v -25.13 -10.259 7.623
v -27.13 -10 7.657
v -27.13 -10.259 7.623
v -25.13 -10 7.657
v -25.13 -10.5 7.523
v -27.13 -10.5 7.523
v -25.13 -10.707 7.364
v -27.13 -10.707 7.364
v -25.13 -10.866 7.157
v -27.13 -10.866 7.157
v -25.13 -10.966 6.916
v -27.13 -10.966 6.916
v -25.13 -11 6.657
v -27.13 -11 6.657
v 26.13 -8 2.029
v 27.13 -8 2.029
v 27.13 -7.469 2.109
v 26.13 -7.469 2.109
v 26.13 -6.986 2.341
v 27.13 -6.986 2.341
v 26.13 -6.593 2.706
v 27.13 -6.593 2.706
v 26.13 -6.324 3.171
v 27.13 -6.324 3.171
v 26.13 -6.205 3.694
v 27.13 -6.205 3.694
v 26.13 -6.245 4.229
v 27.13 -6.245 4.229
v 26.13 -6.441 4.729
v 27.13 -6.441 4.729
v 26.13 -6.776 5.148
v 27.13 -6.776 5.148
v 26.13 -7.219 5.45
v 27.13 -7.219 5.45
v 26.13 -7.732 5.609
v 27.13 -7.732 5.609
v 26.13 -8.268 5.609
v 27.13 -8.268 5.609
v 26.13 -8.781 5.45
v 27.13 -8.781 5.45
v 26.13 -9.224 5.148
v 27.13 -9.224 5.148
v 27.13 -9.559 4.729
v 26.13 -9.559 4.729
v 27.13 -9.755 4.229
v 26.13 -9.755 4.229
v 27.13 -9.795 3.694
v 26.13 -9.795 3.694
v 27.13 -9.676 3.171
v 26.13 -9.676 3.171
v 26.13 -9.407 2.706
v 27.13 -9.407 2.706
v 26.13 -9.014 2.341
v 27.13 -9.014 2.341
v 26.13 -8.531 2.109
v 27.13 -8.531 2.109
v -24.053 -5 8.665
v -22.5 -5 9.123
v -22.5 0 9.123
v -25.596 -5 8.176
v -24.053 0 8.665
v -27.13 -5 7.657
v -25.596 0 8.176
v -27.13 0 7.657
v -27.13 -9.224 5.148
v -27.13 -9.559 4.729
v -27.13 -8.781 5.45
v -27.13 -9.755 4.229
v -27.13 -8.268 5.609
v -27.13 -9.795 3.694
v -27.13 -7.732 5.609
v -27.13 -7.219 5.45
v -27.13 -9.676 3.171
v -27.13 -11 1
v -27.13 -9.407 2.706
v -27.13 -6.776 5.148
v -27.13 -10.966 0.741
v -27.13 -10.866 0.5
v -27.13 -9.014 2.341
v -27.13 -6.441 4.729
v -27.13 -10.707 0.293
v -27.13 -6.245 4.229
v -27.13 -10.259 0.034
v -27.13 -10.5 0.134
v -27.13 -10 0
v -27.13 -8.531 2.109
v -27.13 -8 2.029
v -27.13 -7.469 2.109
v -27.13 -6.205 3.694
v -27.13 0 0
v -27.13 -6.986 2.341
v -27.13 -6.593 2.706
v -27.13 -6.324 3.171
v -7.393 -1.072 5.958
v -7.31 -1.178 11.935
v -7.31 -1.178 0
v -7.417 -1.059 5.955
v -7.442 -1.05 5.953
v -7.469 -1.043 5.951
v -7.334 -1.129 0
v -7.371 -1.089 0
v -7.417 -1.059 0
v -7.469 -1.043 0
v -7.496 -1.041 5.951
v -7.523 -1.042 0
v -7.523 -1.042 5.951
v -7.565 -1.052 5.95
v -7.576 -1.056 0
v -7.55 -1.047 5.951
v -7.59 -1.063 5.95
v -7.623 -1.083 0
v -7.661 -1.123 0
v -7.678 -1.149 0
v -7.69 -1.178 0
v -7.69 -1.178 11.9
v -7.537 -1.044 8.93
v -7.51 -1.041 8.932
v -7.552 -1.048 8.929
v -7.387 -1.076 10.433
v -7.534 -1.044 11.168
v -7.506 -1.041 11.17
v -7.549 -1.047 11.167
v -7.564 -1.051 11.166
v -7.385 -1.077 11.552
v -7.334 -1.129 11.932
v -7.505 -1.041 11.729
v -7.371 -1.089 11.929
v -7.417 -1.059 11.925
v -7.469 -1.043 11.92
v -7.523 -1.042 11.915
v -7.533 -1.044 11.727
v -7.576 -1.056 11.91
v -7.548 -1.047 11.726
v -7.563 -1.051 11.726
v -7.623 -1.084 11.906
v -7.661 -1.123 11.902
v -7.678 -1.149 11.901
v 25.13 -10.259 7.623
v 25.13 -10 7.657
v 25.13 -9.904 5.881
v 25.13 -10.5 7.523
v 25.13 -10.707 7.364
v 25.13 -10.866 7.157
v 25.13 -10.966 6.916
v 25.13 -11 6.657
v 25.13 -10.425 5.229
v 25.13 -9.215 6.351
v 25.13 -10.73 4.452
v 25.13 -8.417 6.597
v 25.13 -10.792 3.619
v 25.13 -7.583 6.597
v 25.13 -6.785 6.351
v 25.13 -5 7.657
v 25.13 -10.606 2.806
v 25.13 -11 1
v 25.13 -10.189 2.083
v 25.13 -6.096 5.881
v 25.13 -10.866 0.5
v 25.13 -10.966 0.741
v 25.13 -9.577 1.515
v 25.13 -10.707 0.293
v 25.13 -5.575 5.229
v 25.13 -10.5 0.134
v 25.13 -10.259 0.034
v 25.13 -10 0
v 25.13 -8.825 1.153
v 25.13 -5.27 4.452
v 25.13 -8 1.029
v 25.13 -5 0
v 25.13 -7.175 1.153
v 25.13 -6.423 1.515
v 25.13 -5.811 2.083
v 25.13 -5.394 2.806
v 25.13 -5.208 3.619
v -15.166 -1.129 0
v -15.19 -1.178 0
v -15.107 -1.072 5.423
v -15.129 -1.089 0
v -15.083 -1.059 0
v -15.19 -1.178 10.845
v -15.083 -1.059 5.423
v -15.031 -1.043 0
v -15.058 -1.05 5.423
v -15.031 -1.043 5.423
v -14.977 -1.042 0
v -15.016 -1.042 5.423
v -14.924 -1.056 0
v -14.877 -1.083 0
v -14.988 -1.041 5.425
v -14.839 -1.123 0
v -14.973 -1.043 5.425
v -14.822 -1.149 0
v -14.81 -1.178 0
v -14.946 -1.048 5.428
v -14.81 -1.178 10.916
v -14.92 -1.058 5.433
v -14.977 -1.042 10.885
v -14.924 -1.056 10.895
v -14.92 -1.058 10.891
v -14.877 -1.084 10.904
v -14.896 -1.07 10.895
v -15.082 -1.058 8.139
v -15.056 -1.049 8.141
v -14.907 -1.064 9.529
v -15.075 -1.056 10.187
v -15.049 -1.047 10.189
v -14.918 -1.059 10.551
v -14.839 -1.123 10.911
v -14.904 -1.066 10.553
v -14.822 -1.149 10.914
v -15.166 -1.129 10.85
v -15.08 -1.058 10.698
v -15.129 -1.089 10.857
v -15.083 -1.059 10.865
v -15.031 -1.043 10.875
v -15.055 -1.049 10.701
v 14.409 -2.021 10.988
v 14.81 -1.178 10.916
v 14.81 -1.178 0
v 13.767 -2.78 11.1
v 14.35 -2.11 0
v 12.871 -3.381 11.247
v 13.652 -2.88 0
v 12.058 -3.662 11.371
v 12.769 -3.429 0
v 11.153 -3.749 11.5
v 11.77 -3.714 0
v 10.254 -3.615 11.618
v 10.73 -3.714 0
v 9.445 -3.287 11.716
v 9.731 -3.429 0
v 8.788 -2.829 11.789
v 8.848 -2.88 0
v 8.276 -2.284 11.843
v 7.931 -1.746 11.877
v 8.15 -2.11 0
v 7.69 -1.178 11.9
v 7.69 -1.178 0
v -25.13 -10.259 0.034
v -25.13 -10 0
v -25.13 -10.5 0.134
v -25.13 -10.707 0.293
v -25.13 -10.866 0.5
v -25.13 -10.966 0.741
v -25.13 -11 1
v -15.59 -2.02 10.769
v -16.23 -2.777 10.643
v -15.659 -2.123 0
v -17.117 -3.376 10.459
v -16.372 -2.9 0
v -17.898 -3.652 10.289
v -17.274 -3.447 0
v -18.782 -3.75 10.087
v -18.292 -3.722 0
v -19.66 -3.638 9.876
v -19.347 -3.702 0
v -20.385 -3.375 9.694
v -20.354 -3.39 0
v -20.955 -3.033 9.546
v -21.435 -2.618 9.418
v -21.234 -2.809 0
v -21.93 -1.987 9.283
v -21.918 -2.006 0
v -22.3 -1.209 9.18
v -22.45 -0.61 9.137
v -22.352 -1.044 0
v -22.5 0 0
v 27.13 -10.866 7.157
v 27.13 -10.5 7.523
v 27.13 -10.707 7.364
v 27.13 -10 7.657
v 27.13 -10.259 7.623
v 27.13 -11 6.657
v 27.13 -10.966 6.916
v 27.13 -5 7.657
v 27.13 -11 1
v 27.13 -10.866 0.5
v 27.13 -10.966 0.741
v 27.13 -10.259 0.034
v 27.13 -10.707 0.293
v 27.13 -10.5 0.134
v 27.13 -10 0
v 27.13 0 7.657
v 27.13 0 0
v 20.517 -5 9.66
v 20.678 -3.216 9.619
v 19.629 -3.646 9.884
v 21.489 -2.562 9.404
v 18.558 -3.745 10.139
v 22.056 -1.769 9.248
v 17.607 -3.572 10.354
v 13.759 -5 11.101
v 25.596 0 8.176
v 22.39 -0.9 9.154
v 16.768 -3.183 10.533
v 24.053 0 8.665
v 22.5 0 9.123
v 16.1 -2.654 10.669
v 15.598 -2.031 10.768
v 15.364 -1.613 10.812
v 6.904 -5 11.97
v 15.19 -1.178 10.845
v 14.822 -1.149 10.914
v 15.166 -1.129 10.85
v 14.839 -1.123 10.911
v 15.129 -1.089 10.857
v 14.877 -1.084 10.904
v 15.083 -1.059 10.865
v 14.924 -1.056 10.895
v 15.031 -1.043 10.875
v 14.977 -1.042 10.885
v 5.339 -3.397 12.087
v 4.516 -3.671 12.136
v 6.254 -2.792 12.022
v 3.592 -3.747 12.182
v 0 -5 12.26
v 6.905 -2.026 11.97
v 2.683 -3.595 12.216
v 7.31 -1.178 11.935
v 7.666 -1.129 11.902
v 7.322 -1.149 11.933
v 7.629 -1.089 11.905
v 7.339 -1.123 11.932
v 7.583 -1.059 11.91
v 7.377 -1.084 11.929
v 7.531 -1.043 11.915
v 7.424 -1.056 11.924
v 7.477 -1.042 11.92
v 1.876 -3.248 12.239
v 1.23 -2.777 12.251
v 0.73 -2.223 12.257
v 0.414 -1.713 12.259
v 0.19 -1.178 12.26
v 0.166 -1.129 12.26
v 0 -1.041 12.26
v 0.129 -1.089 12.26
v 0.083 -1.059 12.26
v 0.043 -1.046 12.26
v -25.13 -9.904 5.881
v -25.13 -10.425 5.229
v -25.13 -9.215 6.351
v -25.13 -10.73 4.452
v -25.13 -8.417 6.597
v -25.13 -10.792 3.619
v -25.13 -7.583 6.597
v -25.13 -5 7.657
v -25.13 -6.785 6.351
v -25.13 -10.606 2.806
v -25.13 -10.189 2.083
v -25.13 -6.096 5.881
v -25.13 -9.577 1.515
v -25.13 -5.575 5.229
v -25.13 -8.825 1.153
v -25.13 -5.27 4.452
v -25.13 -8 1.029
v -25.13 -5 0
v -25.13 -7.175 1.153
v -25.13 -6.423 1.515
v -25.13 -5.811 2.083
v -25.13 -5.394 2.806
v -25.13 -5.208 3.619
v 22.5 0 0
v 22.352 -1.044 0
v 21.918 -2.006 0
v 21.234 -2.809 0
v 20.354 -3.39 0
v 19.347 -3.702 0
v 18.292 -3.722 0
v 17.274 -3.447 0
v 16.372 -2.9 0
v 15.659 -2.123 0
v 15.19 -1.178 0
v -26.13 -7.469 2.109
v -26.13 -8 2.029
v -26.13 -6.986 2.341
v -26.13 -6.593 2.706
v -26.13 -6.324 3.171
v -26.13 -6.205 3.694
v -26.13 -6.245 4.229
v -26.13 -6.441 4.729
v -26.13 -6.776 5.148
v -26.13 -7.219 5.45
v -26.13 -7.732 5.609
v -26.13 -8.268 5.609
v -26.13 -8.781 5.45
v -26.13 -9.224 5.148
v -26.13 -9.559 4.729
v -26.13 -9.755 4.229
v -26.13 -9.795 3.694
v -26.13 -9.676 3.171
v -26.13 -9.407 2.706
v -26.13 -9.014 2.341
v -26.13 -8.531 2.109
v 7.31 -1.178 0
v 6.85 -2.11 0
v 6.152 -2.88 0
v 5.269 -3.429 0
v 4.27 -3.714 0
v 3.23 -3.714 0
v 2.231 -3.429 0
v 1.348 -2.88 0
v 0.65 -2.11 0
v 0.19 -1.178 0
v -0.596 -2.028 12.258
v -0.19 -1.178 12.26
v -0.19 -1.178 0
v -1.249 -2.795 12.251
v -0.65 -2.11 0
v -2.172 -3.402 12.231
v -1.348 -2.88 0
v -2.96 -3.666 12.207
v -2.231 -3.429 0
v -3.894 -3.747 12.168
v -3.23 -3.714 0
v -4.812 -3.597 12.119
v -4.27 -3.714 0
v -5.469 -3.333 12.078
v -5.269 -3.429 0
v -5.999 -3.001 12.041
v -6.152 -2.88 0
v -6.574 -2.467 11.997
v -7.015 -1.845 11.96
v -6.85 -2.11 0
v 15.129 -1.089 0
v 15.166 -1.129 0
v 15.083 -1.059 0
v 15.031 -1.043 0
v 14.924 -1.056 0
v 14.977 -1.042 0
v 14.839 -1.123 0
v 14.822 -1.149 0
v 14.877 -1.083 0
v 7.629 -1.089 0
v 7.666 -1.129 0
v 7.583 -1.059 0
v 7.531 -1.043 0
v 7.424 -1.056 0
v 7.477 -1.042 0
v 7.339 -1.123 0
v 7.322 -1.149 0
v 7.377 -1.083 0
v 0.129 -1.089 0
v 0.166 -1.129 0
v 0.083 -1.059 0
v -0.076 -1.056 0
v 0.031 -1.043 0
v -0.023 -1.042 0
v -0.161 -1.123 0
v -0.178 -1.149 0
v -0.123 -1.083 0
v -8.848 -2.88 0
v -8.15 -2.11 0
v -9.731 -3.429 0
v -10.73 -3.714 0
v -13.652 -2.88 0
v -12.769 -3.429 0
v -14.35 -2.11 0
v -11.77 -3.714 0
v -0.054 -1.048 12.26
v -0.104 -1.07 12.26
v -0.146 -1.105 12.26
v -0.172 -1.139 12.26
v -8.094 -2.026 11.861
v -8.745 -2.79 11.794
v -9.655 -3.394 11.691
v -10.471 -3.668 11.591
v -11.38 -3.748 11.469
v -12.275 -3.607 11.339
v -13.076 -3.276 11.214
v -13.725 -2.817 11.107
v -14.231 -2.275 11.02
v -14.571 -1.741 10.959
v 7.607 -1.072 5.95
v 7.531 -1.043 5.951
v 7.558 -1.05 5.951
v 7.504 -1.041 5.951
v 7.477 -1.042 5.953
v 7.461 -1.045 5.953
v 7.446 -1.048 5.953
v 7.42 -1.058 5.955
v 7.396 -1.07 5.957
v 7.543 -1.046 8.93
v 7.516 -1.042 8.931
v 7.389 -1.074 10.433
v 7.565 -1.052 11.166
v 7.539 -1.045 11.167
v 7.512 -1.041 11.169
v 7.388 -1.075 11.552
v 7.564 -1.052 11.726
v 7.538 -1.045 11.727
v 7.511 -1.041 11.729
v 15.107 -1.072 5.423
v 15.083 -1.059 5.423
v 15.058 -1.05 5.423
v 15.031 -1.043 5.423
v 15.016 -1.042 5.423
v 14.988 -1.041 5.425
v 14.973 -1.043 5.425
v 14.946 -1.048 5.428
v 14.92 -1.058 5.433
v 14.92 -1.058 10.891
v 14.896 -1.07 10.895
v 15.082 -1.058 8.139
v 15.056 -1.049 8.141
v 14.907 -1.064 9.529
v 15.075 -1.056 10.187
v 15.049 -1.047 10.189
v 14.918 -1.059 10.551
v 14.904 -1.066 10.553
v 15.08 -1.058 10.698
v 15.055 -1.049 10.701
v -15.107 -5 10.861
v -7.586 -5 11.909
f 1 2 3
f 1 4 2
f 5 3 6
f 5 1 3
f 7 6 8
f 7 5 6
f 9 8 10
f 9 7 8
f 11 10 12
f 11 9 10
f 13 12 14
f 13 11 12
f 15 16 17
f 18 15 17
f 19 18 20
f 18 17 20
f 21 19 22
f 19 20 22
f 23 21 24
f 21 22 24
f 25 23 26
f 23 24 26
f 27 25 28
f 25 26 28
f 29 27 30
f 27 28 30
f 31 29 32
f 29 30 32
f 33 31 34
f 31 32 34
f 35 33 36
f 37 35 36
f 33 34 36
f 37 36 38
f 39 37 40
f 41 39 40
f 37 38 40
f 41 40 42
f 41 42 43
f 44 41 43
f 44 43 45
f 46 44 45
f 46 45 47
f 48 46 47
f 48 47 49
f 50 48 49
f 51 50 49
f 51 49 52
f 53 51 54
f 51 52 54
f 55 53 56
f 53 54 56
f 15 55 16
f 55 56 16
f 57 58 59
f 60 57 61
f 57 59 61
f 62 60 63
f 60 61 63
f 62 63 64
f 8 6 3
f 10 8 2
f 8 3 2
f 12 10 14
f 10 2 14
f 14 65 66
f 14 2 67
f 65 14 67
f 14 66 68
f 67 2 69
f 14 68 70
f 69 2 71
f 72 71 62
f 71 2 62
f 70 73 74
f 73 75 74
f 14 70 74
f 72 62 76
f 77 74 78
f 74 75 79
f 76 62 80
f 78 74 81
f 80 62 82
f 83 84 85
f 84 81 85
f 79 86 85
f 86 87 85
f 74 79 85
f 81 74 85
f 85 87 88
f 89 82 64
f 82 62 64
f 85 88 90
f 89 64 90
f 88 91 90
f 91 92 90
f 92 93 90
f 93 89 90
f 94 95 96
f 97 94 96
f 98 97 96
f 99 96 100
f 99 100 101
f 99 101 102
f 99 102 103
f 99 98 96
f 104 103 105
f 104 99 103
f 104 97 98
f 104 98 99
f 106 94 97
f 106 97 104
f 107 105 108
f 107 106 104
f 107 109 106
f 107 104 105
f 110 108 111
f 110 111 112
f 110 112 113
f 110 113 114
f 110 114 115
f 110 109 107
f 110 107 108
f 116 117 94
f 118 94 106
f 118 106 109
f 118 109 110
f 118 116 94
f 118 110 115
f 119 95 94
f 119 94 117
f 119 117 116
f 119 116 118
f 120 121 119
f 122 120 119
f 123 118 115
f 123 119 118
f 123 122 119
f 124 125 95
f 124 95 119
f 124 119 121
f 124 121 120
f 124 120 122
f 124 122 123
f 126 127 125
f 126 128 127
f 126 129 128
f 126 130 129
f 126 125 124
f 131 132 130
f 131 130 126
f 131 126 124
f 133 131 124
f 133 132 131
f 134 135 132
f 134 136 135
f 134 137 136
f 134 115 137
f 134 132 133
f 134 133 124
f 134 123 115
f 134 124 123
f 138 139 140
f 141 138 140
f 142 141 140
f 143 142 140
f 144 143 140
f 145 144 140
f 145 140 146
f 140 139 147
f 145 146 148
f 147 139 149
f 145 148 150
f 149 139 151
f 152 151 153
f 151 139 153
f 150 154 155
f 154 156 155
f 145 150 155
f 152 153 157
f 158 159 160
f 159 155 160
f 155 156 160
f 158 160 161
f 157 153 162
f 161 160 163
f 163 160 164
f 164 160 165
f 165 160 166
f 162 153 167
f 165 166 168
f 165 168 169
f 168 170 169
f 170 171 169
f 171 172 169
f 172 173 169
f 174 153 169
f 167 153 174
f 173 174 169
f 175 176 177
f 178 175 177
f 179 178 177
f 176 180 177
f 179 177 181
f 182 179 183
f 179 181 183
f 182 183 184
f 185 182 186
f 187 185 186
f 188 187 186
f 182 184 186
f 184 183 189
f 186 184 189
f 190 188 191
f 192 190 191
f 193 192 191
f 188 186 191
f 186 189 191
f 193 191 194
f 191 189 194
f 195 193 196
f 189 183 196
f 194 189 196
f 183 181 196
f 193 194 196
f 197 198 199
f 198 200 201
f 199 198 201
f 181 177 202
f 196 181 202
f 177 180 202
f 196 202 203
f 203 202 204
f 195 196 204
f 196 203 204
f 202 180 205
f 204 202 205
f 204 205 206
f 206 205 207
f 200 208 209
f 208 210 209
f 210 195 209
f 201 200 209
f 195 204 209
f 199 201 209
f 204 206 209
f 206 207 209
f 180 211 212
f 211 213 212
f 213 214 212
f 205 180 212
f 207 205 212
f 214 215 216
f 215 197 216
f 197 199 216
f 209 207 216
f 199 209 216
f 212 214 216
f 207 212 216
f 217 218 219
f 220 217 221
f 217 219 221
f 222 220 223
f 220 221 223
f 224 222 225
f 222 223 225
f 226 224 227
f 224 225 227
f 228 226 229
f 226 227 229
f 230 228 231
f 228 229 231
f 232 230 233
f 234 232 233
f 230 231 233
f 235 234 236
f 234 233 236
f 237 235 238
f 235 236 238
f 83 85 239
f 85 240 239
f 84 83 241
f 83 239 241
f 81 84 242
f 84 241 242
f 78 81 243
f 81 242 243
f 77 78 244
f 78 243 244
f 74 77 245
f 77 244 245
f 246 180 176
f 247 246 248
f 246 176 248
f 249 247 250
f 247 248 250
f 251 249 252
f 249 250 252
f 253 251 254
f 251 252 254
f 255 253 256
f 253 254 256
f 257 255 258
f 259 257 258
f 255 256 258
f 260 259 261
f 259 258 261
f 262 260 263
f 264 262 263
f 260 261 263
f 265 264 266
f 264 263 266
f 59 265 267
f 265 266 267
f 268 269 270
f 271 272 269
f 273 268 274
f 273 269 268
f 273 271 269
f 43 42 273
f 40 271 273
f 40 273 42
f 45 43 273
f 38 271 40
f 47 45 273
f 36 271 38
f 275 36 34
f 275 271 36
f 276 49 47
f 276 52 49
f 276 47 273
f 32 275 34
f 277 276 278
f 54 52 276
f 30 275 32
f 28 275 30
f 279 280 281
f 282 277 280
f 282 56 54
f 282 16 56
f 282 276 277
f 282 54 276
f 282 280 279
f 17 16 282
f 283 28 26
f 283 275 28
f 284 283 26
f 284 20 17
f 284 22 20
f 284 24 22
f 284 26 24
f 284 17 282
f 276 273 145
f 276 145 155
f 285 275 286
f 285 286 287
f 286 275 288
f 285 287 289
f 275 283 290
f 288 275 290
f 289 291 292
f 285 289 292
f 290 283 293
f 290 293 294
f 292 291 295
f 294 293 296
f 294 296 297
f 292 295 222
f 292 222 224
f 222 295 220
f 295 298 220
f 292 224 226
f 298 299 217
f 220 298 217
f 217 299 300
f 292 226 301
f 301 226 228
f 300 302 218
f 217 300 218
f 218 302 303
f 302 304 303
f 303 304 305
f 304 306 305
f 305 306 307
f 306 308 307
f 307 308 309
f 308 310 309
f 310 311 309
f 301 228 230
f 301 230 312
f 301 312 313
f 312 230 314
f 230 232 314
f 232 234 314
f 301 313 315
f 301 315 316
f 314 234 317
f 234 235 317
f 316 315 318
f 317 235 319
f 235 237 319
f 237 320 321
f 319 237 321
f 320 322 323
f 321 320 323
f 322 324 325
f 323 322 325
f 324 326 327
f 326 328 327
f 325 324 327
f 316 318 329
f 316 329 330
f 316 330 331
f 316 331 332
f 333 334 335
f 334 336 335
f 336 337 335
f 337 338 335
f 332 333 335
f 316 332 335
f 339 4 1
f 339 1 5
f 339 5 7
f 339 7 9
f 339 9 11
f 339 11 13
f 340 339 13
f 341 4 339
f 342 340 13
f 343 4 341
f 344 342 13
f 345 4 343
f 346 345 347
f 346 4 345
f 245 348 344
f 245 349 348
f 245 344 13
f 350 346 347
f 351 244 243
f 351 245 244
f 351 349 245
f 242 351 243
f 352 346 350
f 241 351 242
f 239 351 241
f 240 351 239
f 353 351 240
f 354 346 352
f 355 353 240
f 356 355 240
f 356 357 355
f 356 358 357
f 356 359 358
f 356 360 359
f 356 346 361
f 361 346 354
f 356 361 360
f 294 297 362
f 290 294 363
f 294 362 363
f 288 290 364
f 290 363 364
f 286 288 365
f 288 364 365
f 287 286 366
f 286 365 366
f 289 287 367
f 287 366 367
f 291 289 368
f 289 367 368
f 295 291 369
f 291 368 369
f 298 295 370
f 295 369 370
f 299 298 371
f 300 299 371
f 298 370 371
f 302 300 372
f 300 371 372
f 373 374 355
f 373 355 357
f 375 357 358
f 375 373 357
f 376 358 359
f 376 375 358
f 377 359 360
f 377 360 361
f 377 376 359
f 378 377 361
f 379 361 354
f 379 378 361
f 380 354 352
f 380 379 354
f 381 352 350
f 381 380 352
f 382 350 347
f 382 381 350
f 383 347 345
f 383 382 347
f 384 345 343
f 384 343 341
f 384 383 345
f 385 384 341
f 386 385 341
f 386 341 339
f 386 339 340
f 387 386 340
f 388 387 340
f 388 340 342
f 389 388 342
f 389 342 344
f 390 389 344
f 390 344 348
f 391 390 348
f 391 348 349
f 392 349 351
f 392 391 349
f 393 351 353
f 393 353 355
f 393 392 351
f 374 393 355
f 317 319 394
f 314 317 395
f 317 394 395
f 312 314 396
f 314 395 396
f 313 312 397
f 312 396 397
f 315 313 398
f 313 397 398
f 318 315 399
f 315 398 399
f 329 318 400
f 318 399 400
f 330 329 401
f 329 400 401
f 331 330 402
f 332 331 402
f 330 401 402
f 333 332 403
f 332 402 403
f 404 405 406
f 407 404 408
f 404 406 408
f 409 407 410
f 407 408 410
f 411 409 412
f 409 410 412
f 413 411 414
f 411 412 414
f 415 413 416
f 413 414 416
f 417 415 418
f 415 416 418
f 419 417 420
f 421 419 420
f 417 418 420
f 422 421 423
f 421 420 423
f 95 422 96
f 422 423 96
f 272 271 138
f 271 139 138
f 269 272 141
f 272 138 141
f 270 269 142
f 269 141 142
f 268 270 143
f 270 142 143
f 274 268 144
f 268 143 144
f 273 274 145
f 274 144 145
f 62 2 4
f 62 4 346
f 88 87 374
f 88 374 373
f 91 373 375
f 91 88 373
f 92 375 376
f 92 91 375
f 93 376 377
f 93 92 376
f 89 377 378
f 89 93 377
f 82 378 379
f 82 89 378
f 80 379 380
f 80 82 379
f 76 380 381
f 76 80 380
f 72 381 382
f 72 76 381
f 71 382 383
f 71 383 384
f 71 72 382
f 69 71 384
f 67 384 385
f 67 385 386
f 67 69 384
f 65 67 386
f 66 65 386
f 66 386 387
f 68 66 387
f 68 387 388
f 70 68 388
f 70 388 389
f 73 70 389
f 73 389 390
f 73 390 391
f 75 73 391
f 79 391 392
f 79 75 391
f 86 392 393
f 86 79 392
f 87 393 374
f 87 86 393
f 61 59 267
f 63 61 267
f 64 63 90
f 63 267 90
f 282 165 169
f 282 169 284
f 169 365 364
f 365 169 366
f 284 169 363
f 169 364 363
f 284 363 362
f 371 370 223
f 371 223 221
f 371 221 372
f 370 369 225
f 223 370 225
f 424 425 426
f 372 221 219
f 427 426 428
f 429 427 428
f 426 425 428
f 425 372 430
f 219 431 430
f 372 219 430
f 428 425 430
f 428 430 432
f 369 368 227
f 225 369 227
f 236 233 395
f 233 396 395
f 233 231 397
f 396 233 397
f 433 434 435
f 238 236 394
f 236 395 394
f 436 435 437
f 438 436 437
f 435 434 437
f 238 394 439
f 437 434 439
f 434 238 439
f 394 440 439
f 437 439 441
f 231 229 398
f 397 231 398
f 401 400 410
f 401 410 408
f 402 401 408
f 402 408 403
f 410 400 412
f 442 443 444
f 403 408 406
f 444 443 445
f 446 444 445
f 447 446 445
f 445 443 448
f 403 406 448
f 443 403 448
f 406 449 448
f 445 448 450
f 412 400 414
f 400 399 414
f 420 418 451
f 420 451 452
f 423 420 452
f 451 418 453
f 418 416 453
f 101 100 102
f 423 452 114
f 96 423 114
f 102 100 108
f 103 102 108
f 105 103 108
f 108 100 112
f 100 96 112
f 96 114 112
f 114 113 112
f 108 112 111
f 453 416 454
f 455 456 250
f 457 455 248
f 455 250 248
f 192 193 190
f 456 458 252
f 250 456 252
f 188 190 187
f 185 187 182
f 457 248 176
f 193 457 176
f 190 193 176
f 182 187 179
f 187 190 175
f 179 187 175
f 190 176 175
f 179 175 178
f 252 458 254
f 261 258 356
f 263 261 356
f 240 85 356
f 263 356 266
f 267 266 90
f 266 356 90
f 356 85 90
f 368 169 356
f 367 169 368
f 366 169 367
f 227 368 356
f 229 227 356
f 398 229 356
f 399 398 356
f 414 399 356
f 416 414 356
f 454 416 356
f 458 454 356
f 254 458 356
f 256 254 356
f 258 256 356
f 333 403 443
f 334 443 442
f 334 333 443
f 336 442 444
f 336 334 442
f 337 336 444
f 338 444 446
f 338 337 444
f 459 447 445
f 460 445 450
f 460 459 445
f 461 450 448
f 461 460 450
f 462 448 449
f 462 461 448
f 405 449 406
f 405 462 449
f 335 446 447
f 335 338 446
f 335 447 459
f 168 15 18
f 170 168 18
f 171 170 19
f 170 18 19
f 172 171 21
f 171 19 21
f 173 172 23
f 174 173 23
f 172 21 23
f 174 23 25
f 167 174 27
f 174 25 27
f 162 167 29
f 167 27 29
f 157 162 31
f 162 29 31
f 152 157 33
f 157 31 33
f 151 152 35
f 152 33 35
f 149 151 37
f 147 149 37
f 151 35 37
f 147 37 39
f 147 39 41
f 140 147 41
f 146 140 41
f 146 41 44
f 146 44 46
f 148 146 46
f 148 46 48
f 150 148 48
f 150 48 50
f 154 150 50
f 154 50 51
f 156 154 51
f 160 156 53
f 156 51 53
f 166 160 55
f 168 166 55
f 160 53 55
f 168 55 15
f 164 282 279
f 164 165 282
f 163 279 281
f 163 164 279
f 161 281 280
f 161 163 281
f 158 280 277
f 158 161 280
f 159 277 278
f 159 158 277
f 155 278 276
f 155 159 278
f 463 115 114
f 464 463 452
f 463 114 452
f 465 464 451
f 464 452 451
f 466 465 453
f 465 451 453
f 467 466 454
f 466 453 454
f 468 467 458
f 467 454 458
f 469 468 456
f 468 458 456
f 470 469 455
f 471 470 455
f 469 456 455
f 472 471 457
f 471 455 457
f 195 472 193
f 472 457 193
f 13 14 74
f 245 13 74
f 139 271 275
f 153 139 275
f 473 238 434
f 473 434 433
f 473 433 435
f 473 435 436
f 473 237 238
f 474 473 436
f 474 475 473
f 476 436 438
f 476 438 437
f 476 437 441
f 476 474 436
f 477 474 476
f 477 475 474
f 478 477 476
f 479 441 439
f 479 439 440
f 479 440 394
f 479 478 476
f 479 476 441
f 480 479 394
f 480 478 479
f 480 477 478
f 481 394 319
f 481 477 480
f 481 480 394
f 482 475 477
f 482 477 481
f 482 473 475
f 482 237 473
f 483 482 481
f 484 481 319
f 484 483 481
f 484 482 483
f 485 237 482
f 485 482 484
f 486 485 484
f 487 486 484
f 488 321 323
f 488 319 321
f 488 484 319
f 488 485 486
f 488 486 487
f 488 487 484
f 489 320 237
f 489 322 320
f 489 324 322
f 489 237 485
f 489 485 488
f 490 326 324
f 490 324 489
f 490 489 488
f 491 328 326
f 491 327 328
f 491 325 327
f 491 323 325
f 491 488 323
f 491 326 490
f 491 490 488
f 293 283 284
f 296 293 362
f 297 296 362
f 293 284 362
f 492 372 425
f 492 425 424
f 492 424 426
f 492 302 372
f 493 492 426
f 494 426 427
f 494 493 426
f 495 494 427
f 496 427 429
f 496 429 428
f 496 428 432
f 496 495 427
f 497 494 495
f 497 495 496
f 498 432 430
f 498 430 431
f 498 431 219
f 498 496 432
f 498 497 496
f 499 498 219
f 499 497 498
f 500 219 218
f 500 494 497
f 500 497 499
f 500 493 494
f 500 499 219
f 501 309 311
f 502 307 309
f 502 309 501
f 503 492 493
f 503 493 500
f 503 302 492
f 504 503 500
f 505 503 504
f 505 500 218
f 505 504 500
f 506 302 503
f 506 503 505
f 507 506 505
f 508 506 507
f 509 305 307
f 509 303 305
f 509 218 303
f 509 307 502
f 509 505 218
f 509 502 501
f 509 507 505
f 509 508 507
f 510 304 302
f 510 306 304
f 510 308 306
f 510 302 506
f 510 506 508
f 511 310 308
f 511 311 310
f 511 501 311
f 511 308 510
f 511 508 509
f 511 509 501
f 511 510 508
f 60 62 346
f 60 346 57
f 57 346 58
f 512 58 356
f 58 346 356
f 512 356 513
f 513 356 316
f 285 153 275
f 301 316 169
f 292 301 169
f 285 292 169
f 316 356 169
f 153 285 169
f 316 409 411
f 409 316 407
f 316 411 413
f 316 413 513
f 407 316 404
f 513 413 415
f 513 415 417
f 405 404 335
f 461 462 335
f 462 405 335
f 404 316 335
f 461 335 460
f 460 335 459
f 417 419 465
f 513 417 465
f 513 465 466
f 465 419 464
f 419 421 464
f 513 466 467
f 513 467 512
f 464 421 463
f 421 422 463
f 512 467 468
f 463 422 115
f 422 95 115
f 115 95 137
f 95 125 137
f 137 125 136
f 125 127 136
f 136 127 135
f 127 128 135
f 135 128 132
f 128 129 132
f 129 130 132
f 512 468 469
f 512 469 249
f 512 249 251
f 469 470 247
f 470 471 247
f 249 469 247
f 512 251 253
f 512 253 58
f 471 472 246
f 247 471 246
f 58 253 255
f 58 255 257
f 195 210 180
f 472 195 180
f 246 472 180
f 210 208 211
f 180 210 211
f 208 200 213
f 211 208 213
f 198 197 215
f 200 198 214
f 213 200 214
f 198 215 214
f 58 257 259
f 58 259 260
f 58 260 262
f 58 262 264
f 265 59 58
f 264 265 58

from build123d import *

# Parameters (mm, degrees)
RESSALTO_EXTRUS_O2_DEPTH = 12.26
CORTE_EXTRUS_O1_DEPTH    = 12.26
FILETE1_R                = 0.2
ESBO_O4_W                = 7.65739308
ESBO_O4_H                = 6
ESBO_O4_R                = 1.8
RESSALTO_EXTRUS_O3_DEPTH = 2
FILETE2_R                = 1
CHANFRO1_SIZE            = 1


with BuildPart() as part:
    # Esboço2 → Ressalto-extrusão2 (new body)
    with BuildSketch(Plane.XY):
        with BuildLine():
            Line((-22.5, 0), (-27.13, 0))
            Line((-27.13, 0), (-27.13, -5))
            Line((-27.13, -5), (27.13, -5))
            Line((27.13, -5), (27.13, 0))
            Line((27.13, 0), (22.5, 0))
            ThreePointArc((22.5, 0), (18.75, -3.75), (15, 0))
            ThreePointArc((15, 0), (11.25, -3.75), (7.5, 0))
            ThreePointArc((7.5, 0), (3.75, -3.75), (0, 0))
            ThreePointArc((0, 0), (-3.75, -3.75), (-7.5, 0))
            ThreePointArc((-7.5, 0), (-11.25, -3.75), (-15, 0))
            ThreePointArc((-15, 0), (-18.75, -3.75), (-22.5, 0))
        make_face()
    extrude(amount=RESSALTO_EXTRUS_O2_DEPTH)

    # Esboço3 → Corte-extrusão1 (cut)
    with BuildSketch(Plane(origin=(0, 0, 0), x_dir=(1, 0, 0), z_dir=(0, 1, 0))):
        with BuildLine():
            ThreePointArc((-22.5, -9.123053531), (-24.825818519, -8.424398849), (-27.13, -7.65739308))
            Line((-27.13, -7.65739308), (-27.13, -12.26))
            Line((-27.13, -12.26), (-22.5, -12.26))
            Line((-22.5, -12.26), (-22.5, -9.123053531))
        make_face()
        with BuildLine():
            ThreePointArc((-3.28e-07, -12.26), (-11.358812085, -11.471988978), (-22.5, -9.123053531))
            Line((-22.5, -9.123053531), (-22.5, -12.26))
            Line((-22.5, -12.26), (-3.28e-07, -12.26))
        make_face()
        with BuildLine():
            ThreePointArc((27.13, -7.65739308), (13.758823284, -11.101186069), (-3.28e-07, -12.26))
            Line((-3.28e-07, -12.26), (27.13, -12.26))
            Line((27.13, -12.26), (27.13, -7.65739308))
        make_face()
    extrude(amount=-CORTE_EXTRUS_O1_DEPTH, mode=Mode.SUBTRACT)

    # Filete1
    filete1_edges = [part.edges().sort_by_distance(p)[0] for p in [
        (15, 0, 5.440411719),
        (7.5, 0, 5.958691385),
        (0, 0, 6.13),
        (-7.5, 0, 5.958691385),
        (-15, 0, 5.440411719),
    ]]
    fillet(filete1_edges, radius=FILETE1_R)

    # Esboço4 → Ressalto-extrusão3 (add)
    with BuildSketch(Plane(origin=(27.13, 0, 0), x_dir=(0, 0, -1), z_dir=(1, 0, 0))):
        with Locations((-3.82869654, -8)):
            Rectangle(ESBO_O4_W, ESBO_O4_H)
        with Locations((-3.82869654, -8)):
            Circle(ESBO_O4_R, mode=Mode.SUBTRACT)
    ressalto_extrus_o3 = extrude(amount=-RESSALTO_EXTRUS_O3_DEPTH)

    # Espelhar1: Ressalto-extrusão3 across plane
    add(ressalto_extrus_o3.mirror(Plane(origin=(0, 0, 0), x_dir=(0, 0, 1), z_dir=(1, 0, 0))))

    # Filete2
    filete2_edges = [part.edges().sort_by_distance(p)[0] for p in [
        (26.13, -11, 7.65739308),
        (26.13, -11, 0),
        (-26.13, -11, 7.65739308),
        (-26.13, -11, 0),
    ]]
    fillet(filete2_edges, radius=FILETE2_R)

    # Chanfro1
    chanfro1_edges = [part.edges().sort_by_distance(p)[0] for p in [
        (25.13, -8, 5.62869654),
        (-25.13, -8, 5.62869654),
    ]]
    chamfer(chanfro1_edges, length=CHANFRO1_SIZE)


solid = part.part
